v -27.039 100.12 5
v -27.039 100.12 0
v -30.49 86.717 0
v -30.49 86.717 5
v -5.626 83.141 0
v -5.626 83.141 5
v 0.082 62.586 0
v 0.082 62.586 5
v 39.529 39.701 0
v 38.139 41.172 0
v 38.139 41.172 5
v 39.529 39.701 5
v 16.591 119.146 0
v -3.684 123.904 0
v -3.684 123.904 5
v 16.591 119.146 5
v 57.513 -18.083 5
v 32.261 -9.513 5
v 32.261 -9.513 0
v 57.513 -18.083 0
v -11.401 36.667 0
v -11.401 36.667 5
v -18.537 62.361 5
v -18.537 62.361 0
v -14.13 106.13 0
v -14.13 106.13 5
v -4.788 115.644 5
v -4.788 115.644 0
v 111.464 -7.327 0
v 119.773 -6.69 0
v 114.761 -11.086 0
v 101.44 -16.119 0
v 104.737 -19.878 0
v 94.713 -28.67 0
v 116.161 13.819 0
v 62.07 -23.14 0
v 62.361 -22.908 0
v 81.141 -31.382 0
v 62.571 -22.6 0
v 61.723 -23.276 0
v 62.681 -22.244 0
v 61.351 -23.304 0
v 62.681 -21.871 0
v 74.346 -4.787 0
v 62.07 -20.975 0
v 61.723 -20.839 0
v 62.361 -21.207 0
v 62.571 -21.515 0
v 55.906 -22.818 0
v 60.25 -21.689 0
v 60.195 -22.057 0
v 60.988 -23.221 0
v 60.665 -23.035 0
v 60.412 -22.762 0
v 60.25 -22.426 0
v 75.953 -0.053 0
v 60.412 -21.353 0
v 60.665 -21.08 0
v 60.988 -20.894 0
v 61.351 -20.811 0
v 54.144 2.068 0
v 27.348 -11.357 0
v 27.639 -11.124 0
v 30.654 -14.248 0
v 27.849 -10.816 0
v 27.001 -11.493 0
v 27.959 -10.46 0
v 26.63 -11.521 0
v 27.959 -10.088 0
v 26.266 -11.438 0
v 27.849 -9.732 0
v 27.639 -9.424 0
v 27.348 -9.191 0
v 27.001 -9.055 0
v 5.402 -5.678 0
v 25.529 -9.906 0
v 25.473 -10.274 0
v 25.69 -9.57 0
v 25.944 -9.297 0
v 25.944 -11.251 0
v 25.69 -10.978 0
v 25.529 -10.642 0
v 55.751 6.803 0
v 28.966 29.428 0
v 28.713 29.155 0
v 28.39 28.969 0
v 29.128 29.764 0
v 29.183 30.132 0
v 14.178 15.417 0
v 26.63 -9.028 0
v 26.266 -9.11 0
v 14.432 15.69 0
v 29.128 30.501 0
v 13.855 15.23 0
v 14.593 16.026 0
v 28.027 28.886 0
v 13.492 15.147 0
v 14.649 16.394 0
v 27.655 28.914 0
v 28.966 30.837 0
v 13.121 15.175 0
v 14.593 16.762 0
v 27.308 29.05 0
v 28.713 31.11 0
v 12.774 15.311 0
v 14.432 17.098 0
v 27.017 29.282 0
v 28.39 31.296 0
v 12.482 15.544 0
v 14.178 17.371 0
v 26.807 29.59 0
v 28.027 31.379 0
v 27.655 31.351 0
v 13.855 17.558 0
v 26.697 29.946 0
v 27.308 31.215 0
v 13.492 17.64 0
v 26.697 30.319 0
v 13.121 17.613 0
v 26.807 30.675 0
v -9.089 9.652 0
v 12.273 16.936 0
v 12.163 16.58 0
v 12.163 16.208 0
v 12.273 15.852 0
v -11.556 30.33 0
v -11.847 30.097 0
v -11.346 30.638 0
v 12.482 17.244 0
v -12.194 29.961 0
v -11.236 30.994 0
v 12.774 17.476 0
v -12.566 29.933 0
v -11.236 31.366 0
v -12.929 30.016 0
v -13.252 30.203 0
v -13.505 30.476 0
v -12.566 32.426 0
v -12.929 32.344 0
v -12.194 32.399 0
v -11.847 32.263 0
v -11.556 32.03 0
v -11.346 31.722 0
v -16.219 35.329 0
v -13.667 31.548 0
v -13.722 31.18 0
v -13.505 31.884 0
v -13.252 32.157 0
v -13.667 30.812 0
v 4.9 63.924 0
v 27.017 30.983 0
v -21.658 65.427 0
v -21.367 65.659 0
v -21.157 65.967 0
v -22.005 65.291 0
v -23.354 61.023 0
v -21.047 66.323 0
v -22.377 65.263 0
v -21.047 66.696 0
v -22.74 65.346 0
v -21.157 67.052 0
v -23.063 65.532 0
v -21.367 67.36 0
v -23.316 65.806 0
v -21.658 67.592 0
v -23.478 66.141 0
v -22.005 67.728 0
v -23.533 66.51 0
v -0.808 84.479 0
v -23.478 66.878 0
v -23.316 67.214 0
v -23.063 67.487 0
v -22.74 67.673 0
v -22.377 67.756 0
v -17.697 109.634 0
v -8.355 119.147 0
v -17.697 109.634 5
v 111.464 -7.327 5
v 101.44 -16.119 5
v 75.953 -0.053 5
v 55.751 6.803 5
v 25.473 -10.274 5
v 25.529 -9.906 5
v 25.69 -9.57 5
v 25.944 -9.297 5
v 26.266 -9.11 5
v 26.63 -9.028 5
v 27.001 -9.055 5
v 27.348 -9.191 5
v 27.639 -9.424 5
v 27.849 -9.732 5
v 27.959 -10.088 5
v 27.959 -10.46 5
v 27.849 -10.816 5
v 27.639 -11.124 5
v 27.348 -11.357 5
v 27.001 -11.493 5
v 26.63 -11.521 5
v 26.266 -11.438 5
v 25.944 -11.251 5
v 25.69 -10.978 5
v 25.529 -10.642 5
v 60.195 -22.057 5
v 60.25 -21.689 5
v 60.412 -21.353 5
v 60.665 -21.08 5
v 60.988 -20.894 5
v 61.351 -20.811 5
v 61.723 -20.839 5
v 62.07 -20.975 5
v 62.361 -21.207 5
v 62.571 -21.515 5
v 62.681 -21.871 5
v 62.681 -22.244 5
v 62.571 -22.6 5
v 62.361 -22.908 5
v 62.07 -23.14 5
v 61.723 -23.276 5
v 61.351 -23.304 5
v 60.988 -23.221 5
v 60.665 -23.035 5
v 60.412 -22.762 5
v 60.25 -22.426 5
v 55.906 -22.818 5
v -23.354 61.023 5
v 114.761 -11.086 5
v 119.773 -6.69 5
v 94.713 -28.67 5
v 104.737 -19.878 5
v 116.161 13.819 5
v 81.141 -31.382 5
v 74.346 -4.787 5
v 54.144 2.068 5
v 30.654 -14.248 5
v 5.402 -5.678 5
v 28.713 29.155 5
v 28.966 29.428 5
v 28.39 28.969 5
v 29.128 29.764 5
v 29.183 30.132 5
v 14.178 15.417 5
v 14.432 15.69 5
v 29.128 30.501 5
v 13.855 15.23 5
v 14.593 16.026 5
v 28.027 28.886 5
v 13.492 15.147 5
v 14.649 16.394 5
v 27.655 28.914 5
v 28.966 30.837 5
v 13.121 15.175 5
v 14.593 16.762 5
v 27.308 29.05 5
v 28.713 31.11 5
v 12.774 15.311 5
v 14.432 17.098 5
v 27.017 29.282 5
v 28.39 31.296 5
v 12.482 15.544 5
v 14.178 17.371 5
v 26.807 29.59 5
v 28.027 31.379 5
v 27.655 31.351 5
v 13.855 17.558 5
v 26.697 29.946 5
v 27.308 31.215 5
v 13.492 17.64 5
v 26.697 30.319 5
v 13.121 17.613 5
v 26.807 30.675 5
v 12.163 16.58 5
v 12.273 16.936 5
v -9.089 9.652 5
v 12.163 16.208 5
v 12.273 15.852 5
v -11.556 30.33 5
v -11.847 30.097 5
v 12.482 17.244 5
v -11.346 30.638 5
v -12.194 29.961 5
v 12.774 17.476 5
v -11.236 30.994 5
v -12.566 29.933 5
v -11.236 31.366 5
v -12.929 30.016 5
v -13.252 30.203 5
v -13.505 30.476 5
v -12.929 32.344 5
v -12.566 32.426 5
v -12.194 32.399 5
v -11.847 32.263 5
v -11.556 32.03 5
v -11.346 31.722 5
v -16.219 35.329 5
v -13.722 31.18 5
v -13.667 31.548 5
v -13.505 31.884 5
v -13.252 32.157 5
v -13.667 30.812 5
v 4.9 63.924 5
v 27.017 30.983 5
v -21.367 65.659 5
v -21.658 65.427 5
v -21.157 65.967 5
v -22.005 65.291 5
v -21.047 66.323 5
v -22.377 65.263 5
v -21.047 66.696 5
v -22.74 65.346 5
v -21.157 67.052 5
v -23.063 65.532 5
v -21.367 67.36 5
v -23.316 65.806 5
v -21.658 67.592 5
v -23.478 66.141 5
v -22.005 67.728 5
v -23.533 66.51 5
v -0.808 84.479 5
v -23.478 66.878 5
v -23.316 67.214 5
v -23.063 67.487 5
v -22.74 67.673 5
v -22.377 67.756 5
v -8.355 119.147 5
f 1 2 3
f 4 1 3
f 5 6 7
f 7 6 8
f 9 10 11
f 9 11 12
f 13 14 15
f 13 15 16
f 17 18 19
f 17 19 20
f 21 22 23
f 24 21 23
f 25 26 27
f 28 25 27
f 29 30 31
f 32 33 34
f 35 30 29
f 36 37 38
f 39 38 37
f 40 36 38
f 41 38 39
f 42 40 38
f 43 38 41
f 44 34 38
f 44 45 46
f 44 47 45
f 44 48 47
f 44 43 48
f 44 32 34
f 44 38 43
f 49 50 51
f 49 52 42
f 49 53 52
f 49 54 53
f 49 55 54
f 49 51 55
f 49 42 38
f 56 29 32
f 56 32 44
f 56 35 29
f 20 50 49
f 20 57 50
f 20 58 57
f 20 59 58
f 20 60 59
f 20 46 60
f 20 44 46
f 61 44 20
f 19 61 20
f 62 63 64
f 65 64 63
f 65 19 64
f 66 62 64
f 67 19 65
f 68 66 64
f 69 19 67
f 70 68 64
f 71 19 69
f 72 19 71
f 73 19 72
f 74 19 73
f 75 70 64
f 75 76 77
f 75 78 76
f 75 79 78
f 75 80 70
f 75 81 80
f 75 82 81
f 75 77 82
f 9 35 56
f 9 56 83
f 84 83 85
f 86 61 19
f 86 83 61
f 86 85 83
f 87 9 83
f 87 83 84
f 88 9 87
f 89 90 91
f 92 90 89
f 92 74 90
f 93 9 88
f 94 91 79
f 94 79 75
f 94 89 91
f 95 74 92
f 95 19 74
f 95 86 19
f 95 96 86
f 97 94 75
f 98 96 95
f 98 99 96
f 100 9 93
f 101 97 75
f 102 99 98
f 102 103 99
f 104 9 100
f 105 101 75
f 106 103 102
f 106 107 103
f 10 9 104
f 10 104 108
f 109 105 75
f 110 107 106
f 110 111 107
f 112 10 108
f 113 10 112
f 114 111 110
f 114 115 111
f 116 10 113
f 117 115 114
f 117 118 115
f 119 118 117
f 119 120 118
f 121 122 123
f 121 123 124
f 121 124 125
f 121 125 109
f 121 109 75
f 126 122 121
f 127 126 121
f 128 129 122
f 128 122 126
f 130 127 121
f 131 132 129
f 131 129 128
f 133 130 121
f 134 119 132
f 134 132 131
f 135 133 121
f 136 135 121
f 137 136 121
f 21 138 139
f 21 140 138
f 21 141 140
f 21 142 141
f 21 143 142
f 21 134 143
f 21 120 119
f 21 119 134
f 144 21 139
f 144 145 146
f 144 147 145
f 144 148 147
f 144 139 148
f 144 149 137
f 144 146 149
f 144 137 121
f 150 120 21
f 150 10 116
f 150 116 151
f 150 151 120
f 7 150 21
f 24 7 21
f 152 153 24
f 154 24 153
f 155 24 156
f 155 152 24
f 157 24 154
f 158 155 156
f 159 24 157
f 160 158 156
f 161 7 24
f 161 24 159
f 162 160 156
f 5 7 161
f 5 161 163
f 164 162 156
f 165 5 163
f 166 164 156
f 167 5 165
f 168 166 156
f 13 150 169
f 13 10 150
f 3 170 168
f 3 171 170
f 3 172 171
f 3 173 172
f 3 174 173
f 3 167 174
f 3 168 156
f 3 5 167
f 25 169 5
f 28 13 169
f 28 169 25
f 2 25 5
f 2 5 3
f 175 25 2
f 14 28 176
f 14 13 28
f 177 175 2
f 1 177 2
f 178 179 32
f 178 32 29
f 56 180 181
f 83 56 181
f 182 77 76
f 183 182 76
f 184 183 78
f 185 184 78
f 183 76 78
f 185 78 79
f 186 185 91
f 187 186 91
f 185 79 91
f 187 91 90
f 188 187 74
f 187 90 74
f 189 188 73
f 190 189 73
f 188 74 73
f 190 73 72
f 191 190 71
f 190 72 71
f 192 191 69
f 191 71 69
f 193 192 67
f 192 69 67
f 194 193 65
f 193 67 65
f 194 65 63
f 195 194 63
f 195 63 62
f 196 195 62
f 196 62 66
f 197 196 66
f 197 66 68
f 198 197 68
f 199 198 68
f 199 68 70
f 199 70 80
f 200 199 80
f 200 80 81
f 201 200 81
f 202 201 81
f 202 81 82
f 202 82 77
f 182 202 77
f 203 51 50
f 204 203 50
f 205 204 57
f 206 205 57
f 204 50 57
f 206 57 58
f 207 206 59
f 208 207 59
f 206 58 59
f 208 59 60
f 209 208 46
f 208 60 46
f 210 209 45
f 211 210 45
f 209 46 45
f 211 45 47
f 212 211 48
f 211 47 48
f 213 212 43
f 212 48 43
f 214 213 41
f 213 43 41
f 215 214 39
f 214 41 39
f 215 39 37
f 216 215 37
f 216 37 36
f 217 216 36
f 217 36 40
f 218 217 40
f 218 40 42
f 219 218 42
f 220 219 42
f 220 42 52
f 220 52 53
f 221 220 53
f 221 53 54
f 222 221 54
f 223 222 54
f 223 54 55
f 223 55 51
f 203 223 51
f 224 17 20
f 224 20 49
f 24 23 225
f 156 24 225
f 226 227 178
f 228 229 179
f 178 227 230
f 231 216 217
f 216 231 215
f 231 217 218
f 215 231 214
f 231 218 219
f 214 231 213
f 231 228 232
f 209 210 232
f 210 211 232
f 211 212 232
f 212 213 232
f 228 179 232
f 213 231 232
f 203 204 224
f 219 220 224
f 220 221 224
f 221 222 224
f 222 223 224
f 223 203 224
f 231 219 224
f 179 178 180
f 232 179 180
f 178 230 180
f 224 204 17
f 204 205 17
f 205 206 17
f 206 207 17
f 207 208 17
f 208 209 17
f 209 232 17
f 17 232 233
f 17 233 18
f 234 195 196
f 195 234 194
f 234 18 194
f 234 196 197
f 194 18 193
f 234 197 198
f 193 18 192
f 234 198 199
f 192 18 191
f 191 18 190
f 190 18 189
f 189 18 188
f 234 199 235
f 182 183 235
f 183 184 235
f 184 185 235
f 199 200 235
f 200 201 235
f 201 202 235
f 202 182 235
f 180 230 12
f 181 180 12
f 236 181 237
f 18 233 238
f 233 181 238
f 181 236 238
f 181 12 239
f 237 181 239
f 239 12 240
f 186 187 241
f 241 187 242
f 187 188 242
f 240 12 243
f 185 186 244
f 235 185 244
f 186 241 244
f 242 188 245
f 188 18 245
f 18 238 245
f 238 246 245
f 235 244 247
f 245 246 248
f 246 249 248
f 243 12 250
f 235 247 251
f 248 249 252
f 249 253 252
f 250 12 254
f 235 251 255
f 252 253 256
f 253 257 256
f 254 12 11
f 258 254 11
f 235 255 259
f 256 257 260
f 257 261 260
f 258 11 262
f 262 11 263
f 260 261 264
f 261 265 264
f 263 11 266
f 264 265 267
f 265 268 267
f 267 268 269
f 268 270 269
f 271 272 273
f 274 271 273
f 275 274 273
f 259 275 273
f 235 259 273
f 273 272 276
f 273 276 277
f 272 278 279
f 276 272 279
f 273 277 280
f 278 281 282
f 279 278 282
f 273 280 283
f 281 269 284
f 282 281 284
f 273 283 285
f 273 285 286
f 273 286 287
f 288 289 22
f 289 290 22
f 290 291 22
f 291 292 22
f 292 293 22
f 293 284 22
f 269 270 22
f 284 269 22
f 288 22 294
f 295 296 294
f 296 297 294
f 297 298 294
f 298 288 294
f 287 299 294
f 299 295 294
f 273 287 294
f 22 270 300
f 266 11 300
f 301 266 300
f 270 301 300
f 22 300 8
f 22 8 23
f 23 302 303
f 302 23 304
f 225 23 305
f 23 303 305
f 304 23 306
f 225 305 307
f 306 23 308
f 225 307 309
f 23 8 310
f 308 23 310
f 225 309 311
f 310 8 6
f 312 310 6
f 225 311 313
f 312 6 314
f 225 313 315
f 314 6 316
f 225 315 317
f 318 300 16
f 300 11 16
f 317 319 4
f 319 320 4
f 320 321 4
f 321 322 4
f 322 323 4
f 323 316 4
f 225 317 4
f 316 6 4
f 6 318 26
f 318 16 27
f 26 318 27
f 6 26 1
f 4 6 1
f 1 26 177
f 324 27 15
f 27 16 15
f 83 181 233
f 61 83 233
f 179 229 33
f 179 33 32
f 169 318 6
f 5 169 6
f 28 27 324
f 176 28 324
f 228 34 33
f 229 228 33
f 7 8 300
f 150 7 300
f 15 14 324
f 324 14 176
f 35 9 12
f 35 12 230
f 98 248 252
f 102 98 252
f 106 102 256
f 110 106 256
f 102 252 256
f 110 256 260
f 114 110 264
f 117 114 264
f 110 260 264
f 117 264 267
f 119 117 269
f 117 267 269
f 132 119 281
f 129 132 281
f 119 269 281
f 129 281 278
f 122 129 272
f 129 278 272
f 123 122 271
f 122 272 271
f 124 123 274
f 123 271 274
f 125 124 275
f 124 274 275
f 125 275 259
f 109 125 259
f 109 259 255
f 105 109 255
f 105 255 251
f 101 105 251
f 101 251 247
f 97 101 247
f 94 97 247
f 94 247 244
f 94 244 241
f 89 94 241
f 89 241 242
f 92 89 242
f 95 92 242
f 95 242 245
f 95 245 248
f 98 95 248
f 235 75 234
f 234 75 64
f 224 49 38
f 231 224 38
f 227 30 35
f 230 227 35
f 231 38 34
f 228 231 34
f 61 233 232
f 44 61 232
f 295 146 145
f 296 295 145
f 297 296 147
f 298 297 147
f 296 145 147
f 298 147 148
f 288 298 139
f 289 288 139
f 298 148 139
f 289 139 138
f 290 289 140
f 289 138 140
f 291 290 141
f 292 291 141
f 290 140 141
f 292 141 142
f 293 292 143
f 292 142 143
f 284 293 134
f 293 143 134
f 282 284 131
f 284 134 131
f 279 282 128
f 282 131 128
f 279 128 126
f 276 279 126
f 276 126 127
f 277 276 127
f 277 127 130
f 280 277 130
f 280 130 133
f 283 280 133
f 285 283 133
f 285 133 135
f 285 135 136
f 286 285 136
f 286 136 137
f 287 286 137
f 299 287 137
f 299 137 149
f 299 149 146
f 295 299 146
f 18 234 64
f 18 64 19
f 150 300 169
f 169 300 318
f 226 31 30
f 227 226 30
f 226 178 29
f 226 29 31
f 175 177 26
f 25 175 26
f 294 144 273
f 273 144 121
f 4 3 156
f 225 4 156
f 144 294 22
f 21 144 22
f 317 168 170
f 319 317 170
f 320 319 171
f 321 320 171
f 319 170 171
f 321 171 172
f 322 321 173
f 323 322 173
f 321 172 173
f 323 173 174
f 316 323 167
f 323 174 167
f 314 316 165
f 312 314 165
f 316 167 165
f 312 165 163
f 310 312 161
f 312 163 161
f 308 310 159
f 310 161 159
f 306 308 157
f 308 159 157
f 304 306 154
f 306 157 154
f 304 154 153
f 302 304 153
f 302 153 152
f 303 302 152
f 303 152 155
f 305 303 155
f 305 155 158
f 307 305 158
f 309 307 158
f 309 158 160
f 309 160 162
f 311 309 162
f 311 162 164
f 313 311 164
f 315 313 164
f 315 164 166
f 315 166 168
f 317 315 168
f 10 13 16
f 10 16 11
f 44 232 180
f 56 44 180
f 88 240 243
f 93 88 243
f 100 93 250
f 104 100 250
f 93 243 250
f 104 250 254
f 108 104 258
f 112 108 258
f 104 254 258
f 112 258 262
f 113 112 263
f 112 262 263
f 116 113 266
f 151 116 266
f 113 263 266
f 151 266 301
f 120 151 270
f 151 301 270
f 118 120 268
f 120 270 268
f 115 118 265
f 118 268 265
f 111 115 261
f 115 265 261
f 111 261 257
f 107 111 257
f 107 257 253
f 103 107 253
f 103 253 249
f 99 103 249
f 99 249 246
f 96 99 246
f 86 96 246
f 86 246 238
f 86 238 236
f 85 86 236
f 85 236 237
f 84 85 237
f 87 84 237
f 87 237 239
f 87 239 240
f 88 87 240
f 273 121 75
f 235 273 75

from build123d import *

# Parameters (mm, degrees)
SALIENTE_EXTRUIR1_DEPTH = 5
CROQUIS2_R              = 1.25
CORTAR_EXTRUIR1_DEPTH   = 10
CORTAR_EXTRUIR2_DEPTH   = 22
CORTAR_EXTRUIR3_DEPTH   = 10
SALIENTE_EXTRUIR2_DEPTH = 5
CROQUIS7_R              = 1.25
CORTAR_EXTRUIR4_DEPTH   = 10
SALIENTE_EXTRUIR3_DEPTH = 5
CORTAR_EXTRUIR7_DEPTH   = 10


with BuildPart() as part:
    # Croquis1 → Saliente-Extruir1 (new body)
    with BuildSketch(Plane.XY):
        Polygon((94.71302301, -28.670259317), (124.784571975, -2.294096918), (121.487551675, 1.464846702), (33.971255169, 31.023525729), (29.162783478, 36.110627065), (4.554636507, 125.156882092), (0.987169784, 128.660192123), (-27.039310471, 100.120458339), (-30.489528096, 86.717422014), (-9.088639631, 9.652046375), (5.402210696, -5.678484568), (81.141270829, -31.381887447), align=None)
    extrude(amount=SALIENTE_EXTRUIR1_DEPTH)

    # Croquis2 → Cortar-Extruir1 (cut)
    with BuildSketch(Plane.XY.offset(5)):
        with Locations((27.933375513, 30.132453761)):
            Circle(CROQUIS2_R)
        with Locations((13.398800269, 16.393963215)):
            Circle(CROQUIS2_R)
    extrude(amount=-CORTAR_EXTRUIR1_DEPTH, mode=Mode.SUBTRACT)

    # Croquis3 → Cortar-Extruir2 (cut)
    with BuildSketch(Plane.XY.offset(5)):
        Polygon((32.261175329, -9.513472178), (57.513309445, -18.083234934), (55.906478928, -22.818010081), (30.654344812, -14.248247324), align=None)
        Polygon((101.439852365, -16.119261564), (111.46370202, -7.327207431), (114.76072232, -11.086151051), (104.736872665, -19.878205184), align=None)
        Polygon((-11.401313453, 36.666602778), (-18.536576351, 62.360943293), (-23.354265197, 61.023081499), (-16.219002299, 35.328740985), align=None)
        Polygon((-14.129683663, 106.130392902), (-4.787523578, 115.643637497), (-8.354990301, 119.146947529), (-17.697150386, 109.633702934), align=None)
    extrude(amount=-CORTAR_EXTRUIR2_DEPTH, mode=Mode.SUBTRACT)

    # Croquis4 → Cortar-Extruir3 (cut)
    with BuildSketch(Plane.XY.offset(5)):
        Polygon((-0.808419356, 84.479263676), (-5.626108202, 83.141401882), (0.082102116, 62.58592947), (4.899790963, 63.923791264), align=None)
        Polygon((55.750831206, 6.80326974), (54.144000689, 2.068494593), (74.345707981, -4.787315612), (75.952538498, -0.052540465), align=None)
    extrude(amount=-CORTAR_EXTRUIR3_DEPTH, mode=Mode.SUBTRACT)

    # Croquis5 → Saliente-Extruir2 (add)
    with BuildSketch(Plane.XY.offset(5)):
        Polygon((4.554636507, 125.156882092), (9.373993305, 126.488722946), (33.650829441, 38.641338728), (36.750129482, 35.362447971), (123.087510452, 6.201948338), (121.487551675, 1.464846702), (33.971255169, 31.023525729), (29.162783478, 36.110627065), align=None)
    extrude(amount=-SALIENTE_EXTRUIR2_DEPTH)

    # Croquis7 → Cortar-Extruir4 (cut)
    with BuildSketch(Plane(origin=(0, 0, 0), x_dir=(-1, 0, 0), z_dir=(0, 0, -1))):
        with Locations((-61.444669333, -22.057453024)):
            Circle(CROQUIS7_R)
        with Locations((-26.722984924, -10.274029234)):
            Circle(CROQUIS7_R)
        with Locations((12.472296082, 31.179983035)):
            Circle(CROQUIS7_R)
        with Locations((22.283282568, 66.509701242)):
            Circle(CROQUIS7_R)
    extrude(amount=-CORTAR_EXTRUIR4_DEPTH, mode=Mode.SUBTRACT)

    # Croquis8 → Saliente-Extruir3 (add)
    with BuildSketch(Plane(origin=(0, 0, 0), x_dir=(-1, 0, 0), z_dir=(0, 0, -1))):
        Polygon((-33.650829441, 38.641338728), (-9.373993305, 126.488722946), (-14.193350102, 127.8205638), (-38.138875404, 41.172050391), (-39.529003796, 39.701370213), (-124.68746923, 10.939049974), (-123.087510452, 6.201948338), (-36.750129482, 35.362447971), align=None)
    extrude(amount=-SALIENTE_EXTRUIR3_DEPTH)

    # Croquis9 → Cortar-Extruir7 (cut)
    with BuildSketch(Plane(origin=(0, 0, 0), x_dir=(-1, 0, 0), z_dir=(0, 0, -1))):
        Polygon((-119.772647147, -6.690123985), (-116.160686285, 13.818975774), (-124.68746923, 10.939049974), (-121.487551675, 1.464846702), (-124.784571975, -2.294096918), align=None)
        Polygon((3.683910258, 123.903569826), (-16.59066364, 119.145721565), (-14.193350102, 127.8205638), (-4.554636507, 125.156882092), (-0.987169784, 128.660192123), align=None)
    extrude(amount=-CORTAR_EXTRUIR7_DEPTH, mode=Mode.SUBTRACT)


solid = part.part
